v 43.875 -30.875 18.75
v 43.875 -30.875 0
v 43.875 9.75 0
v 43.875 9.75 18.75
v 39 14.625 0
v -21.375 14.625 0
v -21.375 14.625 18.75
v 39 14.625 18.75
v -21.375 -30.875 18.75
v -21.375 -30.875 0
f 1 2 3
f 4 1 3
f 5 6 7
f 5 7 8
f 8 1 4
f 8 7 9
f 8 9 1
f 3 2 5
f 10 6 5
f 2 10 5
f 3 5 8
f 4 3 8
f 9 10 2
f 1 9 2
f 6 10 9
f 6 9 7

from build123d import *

# Parameters (mm, degrees)
CHAMFERSTOCKSKETCH_W         = 65.25
CHAMFERSTOCKSKETCH_H         = 45.5
CHAMFERSTOCKBOSS_DEPTH       = 18.75
DISTANCEPAIREDGECHAMFER_SIZE = 4.875


with BuildPart() as part:
    # ChamferStockSketch → ChamferStockBoss (new body)
    with BuildSketch(Plane.XY):
        with Locations((11.25, -8.125)):
            Rectangle(CHAMFERSTOCKSKETCH_W, CHAMFERSTOCKSKETCH_H)
    extrude(amount=CHAMFERSTOCKBOSS_DEPTH)

    # DistancePairEdgeChamfer
    distancepairedgechamfer_edges = [part.edges().sort_by_distance(p)[0] for p in [
        (43.875, 14.625, 9.375),
    ]]
    chamfer(distancepairedgechamfer_edges, length=DISTANCEPAIREDGECHAMFER_SIZE)


solid = part.part
